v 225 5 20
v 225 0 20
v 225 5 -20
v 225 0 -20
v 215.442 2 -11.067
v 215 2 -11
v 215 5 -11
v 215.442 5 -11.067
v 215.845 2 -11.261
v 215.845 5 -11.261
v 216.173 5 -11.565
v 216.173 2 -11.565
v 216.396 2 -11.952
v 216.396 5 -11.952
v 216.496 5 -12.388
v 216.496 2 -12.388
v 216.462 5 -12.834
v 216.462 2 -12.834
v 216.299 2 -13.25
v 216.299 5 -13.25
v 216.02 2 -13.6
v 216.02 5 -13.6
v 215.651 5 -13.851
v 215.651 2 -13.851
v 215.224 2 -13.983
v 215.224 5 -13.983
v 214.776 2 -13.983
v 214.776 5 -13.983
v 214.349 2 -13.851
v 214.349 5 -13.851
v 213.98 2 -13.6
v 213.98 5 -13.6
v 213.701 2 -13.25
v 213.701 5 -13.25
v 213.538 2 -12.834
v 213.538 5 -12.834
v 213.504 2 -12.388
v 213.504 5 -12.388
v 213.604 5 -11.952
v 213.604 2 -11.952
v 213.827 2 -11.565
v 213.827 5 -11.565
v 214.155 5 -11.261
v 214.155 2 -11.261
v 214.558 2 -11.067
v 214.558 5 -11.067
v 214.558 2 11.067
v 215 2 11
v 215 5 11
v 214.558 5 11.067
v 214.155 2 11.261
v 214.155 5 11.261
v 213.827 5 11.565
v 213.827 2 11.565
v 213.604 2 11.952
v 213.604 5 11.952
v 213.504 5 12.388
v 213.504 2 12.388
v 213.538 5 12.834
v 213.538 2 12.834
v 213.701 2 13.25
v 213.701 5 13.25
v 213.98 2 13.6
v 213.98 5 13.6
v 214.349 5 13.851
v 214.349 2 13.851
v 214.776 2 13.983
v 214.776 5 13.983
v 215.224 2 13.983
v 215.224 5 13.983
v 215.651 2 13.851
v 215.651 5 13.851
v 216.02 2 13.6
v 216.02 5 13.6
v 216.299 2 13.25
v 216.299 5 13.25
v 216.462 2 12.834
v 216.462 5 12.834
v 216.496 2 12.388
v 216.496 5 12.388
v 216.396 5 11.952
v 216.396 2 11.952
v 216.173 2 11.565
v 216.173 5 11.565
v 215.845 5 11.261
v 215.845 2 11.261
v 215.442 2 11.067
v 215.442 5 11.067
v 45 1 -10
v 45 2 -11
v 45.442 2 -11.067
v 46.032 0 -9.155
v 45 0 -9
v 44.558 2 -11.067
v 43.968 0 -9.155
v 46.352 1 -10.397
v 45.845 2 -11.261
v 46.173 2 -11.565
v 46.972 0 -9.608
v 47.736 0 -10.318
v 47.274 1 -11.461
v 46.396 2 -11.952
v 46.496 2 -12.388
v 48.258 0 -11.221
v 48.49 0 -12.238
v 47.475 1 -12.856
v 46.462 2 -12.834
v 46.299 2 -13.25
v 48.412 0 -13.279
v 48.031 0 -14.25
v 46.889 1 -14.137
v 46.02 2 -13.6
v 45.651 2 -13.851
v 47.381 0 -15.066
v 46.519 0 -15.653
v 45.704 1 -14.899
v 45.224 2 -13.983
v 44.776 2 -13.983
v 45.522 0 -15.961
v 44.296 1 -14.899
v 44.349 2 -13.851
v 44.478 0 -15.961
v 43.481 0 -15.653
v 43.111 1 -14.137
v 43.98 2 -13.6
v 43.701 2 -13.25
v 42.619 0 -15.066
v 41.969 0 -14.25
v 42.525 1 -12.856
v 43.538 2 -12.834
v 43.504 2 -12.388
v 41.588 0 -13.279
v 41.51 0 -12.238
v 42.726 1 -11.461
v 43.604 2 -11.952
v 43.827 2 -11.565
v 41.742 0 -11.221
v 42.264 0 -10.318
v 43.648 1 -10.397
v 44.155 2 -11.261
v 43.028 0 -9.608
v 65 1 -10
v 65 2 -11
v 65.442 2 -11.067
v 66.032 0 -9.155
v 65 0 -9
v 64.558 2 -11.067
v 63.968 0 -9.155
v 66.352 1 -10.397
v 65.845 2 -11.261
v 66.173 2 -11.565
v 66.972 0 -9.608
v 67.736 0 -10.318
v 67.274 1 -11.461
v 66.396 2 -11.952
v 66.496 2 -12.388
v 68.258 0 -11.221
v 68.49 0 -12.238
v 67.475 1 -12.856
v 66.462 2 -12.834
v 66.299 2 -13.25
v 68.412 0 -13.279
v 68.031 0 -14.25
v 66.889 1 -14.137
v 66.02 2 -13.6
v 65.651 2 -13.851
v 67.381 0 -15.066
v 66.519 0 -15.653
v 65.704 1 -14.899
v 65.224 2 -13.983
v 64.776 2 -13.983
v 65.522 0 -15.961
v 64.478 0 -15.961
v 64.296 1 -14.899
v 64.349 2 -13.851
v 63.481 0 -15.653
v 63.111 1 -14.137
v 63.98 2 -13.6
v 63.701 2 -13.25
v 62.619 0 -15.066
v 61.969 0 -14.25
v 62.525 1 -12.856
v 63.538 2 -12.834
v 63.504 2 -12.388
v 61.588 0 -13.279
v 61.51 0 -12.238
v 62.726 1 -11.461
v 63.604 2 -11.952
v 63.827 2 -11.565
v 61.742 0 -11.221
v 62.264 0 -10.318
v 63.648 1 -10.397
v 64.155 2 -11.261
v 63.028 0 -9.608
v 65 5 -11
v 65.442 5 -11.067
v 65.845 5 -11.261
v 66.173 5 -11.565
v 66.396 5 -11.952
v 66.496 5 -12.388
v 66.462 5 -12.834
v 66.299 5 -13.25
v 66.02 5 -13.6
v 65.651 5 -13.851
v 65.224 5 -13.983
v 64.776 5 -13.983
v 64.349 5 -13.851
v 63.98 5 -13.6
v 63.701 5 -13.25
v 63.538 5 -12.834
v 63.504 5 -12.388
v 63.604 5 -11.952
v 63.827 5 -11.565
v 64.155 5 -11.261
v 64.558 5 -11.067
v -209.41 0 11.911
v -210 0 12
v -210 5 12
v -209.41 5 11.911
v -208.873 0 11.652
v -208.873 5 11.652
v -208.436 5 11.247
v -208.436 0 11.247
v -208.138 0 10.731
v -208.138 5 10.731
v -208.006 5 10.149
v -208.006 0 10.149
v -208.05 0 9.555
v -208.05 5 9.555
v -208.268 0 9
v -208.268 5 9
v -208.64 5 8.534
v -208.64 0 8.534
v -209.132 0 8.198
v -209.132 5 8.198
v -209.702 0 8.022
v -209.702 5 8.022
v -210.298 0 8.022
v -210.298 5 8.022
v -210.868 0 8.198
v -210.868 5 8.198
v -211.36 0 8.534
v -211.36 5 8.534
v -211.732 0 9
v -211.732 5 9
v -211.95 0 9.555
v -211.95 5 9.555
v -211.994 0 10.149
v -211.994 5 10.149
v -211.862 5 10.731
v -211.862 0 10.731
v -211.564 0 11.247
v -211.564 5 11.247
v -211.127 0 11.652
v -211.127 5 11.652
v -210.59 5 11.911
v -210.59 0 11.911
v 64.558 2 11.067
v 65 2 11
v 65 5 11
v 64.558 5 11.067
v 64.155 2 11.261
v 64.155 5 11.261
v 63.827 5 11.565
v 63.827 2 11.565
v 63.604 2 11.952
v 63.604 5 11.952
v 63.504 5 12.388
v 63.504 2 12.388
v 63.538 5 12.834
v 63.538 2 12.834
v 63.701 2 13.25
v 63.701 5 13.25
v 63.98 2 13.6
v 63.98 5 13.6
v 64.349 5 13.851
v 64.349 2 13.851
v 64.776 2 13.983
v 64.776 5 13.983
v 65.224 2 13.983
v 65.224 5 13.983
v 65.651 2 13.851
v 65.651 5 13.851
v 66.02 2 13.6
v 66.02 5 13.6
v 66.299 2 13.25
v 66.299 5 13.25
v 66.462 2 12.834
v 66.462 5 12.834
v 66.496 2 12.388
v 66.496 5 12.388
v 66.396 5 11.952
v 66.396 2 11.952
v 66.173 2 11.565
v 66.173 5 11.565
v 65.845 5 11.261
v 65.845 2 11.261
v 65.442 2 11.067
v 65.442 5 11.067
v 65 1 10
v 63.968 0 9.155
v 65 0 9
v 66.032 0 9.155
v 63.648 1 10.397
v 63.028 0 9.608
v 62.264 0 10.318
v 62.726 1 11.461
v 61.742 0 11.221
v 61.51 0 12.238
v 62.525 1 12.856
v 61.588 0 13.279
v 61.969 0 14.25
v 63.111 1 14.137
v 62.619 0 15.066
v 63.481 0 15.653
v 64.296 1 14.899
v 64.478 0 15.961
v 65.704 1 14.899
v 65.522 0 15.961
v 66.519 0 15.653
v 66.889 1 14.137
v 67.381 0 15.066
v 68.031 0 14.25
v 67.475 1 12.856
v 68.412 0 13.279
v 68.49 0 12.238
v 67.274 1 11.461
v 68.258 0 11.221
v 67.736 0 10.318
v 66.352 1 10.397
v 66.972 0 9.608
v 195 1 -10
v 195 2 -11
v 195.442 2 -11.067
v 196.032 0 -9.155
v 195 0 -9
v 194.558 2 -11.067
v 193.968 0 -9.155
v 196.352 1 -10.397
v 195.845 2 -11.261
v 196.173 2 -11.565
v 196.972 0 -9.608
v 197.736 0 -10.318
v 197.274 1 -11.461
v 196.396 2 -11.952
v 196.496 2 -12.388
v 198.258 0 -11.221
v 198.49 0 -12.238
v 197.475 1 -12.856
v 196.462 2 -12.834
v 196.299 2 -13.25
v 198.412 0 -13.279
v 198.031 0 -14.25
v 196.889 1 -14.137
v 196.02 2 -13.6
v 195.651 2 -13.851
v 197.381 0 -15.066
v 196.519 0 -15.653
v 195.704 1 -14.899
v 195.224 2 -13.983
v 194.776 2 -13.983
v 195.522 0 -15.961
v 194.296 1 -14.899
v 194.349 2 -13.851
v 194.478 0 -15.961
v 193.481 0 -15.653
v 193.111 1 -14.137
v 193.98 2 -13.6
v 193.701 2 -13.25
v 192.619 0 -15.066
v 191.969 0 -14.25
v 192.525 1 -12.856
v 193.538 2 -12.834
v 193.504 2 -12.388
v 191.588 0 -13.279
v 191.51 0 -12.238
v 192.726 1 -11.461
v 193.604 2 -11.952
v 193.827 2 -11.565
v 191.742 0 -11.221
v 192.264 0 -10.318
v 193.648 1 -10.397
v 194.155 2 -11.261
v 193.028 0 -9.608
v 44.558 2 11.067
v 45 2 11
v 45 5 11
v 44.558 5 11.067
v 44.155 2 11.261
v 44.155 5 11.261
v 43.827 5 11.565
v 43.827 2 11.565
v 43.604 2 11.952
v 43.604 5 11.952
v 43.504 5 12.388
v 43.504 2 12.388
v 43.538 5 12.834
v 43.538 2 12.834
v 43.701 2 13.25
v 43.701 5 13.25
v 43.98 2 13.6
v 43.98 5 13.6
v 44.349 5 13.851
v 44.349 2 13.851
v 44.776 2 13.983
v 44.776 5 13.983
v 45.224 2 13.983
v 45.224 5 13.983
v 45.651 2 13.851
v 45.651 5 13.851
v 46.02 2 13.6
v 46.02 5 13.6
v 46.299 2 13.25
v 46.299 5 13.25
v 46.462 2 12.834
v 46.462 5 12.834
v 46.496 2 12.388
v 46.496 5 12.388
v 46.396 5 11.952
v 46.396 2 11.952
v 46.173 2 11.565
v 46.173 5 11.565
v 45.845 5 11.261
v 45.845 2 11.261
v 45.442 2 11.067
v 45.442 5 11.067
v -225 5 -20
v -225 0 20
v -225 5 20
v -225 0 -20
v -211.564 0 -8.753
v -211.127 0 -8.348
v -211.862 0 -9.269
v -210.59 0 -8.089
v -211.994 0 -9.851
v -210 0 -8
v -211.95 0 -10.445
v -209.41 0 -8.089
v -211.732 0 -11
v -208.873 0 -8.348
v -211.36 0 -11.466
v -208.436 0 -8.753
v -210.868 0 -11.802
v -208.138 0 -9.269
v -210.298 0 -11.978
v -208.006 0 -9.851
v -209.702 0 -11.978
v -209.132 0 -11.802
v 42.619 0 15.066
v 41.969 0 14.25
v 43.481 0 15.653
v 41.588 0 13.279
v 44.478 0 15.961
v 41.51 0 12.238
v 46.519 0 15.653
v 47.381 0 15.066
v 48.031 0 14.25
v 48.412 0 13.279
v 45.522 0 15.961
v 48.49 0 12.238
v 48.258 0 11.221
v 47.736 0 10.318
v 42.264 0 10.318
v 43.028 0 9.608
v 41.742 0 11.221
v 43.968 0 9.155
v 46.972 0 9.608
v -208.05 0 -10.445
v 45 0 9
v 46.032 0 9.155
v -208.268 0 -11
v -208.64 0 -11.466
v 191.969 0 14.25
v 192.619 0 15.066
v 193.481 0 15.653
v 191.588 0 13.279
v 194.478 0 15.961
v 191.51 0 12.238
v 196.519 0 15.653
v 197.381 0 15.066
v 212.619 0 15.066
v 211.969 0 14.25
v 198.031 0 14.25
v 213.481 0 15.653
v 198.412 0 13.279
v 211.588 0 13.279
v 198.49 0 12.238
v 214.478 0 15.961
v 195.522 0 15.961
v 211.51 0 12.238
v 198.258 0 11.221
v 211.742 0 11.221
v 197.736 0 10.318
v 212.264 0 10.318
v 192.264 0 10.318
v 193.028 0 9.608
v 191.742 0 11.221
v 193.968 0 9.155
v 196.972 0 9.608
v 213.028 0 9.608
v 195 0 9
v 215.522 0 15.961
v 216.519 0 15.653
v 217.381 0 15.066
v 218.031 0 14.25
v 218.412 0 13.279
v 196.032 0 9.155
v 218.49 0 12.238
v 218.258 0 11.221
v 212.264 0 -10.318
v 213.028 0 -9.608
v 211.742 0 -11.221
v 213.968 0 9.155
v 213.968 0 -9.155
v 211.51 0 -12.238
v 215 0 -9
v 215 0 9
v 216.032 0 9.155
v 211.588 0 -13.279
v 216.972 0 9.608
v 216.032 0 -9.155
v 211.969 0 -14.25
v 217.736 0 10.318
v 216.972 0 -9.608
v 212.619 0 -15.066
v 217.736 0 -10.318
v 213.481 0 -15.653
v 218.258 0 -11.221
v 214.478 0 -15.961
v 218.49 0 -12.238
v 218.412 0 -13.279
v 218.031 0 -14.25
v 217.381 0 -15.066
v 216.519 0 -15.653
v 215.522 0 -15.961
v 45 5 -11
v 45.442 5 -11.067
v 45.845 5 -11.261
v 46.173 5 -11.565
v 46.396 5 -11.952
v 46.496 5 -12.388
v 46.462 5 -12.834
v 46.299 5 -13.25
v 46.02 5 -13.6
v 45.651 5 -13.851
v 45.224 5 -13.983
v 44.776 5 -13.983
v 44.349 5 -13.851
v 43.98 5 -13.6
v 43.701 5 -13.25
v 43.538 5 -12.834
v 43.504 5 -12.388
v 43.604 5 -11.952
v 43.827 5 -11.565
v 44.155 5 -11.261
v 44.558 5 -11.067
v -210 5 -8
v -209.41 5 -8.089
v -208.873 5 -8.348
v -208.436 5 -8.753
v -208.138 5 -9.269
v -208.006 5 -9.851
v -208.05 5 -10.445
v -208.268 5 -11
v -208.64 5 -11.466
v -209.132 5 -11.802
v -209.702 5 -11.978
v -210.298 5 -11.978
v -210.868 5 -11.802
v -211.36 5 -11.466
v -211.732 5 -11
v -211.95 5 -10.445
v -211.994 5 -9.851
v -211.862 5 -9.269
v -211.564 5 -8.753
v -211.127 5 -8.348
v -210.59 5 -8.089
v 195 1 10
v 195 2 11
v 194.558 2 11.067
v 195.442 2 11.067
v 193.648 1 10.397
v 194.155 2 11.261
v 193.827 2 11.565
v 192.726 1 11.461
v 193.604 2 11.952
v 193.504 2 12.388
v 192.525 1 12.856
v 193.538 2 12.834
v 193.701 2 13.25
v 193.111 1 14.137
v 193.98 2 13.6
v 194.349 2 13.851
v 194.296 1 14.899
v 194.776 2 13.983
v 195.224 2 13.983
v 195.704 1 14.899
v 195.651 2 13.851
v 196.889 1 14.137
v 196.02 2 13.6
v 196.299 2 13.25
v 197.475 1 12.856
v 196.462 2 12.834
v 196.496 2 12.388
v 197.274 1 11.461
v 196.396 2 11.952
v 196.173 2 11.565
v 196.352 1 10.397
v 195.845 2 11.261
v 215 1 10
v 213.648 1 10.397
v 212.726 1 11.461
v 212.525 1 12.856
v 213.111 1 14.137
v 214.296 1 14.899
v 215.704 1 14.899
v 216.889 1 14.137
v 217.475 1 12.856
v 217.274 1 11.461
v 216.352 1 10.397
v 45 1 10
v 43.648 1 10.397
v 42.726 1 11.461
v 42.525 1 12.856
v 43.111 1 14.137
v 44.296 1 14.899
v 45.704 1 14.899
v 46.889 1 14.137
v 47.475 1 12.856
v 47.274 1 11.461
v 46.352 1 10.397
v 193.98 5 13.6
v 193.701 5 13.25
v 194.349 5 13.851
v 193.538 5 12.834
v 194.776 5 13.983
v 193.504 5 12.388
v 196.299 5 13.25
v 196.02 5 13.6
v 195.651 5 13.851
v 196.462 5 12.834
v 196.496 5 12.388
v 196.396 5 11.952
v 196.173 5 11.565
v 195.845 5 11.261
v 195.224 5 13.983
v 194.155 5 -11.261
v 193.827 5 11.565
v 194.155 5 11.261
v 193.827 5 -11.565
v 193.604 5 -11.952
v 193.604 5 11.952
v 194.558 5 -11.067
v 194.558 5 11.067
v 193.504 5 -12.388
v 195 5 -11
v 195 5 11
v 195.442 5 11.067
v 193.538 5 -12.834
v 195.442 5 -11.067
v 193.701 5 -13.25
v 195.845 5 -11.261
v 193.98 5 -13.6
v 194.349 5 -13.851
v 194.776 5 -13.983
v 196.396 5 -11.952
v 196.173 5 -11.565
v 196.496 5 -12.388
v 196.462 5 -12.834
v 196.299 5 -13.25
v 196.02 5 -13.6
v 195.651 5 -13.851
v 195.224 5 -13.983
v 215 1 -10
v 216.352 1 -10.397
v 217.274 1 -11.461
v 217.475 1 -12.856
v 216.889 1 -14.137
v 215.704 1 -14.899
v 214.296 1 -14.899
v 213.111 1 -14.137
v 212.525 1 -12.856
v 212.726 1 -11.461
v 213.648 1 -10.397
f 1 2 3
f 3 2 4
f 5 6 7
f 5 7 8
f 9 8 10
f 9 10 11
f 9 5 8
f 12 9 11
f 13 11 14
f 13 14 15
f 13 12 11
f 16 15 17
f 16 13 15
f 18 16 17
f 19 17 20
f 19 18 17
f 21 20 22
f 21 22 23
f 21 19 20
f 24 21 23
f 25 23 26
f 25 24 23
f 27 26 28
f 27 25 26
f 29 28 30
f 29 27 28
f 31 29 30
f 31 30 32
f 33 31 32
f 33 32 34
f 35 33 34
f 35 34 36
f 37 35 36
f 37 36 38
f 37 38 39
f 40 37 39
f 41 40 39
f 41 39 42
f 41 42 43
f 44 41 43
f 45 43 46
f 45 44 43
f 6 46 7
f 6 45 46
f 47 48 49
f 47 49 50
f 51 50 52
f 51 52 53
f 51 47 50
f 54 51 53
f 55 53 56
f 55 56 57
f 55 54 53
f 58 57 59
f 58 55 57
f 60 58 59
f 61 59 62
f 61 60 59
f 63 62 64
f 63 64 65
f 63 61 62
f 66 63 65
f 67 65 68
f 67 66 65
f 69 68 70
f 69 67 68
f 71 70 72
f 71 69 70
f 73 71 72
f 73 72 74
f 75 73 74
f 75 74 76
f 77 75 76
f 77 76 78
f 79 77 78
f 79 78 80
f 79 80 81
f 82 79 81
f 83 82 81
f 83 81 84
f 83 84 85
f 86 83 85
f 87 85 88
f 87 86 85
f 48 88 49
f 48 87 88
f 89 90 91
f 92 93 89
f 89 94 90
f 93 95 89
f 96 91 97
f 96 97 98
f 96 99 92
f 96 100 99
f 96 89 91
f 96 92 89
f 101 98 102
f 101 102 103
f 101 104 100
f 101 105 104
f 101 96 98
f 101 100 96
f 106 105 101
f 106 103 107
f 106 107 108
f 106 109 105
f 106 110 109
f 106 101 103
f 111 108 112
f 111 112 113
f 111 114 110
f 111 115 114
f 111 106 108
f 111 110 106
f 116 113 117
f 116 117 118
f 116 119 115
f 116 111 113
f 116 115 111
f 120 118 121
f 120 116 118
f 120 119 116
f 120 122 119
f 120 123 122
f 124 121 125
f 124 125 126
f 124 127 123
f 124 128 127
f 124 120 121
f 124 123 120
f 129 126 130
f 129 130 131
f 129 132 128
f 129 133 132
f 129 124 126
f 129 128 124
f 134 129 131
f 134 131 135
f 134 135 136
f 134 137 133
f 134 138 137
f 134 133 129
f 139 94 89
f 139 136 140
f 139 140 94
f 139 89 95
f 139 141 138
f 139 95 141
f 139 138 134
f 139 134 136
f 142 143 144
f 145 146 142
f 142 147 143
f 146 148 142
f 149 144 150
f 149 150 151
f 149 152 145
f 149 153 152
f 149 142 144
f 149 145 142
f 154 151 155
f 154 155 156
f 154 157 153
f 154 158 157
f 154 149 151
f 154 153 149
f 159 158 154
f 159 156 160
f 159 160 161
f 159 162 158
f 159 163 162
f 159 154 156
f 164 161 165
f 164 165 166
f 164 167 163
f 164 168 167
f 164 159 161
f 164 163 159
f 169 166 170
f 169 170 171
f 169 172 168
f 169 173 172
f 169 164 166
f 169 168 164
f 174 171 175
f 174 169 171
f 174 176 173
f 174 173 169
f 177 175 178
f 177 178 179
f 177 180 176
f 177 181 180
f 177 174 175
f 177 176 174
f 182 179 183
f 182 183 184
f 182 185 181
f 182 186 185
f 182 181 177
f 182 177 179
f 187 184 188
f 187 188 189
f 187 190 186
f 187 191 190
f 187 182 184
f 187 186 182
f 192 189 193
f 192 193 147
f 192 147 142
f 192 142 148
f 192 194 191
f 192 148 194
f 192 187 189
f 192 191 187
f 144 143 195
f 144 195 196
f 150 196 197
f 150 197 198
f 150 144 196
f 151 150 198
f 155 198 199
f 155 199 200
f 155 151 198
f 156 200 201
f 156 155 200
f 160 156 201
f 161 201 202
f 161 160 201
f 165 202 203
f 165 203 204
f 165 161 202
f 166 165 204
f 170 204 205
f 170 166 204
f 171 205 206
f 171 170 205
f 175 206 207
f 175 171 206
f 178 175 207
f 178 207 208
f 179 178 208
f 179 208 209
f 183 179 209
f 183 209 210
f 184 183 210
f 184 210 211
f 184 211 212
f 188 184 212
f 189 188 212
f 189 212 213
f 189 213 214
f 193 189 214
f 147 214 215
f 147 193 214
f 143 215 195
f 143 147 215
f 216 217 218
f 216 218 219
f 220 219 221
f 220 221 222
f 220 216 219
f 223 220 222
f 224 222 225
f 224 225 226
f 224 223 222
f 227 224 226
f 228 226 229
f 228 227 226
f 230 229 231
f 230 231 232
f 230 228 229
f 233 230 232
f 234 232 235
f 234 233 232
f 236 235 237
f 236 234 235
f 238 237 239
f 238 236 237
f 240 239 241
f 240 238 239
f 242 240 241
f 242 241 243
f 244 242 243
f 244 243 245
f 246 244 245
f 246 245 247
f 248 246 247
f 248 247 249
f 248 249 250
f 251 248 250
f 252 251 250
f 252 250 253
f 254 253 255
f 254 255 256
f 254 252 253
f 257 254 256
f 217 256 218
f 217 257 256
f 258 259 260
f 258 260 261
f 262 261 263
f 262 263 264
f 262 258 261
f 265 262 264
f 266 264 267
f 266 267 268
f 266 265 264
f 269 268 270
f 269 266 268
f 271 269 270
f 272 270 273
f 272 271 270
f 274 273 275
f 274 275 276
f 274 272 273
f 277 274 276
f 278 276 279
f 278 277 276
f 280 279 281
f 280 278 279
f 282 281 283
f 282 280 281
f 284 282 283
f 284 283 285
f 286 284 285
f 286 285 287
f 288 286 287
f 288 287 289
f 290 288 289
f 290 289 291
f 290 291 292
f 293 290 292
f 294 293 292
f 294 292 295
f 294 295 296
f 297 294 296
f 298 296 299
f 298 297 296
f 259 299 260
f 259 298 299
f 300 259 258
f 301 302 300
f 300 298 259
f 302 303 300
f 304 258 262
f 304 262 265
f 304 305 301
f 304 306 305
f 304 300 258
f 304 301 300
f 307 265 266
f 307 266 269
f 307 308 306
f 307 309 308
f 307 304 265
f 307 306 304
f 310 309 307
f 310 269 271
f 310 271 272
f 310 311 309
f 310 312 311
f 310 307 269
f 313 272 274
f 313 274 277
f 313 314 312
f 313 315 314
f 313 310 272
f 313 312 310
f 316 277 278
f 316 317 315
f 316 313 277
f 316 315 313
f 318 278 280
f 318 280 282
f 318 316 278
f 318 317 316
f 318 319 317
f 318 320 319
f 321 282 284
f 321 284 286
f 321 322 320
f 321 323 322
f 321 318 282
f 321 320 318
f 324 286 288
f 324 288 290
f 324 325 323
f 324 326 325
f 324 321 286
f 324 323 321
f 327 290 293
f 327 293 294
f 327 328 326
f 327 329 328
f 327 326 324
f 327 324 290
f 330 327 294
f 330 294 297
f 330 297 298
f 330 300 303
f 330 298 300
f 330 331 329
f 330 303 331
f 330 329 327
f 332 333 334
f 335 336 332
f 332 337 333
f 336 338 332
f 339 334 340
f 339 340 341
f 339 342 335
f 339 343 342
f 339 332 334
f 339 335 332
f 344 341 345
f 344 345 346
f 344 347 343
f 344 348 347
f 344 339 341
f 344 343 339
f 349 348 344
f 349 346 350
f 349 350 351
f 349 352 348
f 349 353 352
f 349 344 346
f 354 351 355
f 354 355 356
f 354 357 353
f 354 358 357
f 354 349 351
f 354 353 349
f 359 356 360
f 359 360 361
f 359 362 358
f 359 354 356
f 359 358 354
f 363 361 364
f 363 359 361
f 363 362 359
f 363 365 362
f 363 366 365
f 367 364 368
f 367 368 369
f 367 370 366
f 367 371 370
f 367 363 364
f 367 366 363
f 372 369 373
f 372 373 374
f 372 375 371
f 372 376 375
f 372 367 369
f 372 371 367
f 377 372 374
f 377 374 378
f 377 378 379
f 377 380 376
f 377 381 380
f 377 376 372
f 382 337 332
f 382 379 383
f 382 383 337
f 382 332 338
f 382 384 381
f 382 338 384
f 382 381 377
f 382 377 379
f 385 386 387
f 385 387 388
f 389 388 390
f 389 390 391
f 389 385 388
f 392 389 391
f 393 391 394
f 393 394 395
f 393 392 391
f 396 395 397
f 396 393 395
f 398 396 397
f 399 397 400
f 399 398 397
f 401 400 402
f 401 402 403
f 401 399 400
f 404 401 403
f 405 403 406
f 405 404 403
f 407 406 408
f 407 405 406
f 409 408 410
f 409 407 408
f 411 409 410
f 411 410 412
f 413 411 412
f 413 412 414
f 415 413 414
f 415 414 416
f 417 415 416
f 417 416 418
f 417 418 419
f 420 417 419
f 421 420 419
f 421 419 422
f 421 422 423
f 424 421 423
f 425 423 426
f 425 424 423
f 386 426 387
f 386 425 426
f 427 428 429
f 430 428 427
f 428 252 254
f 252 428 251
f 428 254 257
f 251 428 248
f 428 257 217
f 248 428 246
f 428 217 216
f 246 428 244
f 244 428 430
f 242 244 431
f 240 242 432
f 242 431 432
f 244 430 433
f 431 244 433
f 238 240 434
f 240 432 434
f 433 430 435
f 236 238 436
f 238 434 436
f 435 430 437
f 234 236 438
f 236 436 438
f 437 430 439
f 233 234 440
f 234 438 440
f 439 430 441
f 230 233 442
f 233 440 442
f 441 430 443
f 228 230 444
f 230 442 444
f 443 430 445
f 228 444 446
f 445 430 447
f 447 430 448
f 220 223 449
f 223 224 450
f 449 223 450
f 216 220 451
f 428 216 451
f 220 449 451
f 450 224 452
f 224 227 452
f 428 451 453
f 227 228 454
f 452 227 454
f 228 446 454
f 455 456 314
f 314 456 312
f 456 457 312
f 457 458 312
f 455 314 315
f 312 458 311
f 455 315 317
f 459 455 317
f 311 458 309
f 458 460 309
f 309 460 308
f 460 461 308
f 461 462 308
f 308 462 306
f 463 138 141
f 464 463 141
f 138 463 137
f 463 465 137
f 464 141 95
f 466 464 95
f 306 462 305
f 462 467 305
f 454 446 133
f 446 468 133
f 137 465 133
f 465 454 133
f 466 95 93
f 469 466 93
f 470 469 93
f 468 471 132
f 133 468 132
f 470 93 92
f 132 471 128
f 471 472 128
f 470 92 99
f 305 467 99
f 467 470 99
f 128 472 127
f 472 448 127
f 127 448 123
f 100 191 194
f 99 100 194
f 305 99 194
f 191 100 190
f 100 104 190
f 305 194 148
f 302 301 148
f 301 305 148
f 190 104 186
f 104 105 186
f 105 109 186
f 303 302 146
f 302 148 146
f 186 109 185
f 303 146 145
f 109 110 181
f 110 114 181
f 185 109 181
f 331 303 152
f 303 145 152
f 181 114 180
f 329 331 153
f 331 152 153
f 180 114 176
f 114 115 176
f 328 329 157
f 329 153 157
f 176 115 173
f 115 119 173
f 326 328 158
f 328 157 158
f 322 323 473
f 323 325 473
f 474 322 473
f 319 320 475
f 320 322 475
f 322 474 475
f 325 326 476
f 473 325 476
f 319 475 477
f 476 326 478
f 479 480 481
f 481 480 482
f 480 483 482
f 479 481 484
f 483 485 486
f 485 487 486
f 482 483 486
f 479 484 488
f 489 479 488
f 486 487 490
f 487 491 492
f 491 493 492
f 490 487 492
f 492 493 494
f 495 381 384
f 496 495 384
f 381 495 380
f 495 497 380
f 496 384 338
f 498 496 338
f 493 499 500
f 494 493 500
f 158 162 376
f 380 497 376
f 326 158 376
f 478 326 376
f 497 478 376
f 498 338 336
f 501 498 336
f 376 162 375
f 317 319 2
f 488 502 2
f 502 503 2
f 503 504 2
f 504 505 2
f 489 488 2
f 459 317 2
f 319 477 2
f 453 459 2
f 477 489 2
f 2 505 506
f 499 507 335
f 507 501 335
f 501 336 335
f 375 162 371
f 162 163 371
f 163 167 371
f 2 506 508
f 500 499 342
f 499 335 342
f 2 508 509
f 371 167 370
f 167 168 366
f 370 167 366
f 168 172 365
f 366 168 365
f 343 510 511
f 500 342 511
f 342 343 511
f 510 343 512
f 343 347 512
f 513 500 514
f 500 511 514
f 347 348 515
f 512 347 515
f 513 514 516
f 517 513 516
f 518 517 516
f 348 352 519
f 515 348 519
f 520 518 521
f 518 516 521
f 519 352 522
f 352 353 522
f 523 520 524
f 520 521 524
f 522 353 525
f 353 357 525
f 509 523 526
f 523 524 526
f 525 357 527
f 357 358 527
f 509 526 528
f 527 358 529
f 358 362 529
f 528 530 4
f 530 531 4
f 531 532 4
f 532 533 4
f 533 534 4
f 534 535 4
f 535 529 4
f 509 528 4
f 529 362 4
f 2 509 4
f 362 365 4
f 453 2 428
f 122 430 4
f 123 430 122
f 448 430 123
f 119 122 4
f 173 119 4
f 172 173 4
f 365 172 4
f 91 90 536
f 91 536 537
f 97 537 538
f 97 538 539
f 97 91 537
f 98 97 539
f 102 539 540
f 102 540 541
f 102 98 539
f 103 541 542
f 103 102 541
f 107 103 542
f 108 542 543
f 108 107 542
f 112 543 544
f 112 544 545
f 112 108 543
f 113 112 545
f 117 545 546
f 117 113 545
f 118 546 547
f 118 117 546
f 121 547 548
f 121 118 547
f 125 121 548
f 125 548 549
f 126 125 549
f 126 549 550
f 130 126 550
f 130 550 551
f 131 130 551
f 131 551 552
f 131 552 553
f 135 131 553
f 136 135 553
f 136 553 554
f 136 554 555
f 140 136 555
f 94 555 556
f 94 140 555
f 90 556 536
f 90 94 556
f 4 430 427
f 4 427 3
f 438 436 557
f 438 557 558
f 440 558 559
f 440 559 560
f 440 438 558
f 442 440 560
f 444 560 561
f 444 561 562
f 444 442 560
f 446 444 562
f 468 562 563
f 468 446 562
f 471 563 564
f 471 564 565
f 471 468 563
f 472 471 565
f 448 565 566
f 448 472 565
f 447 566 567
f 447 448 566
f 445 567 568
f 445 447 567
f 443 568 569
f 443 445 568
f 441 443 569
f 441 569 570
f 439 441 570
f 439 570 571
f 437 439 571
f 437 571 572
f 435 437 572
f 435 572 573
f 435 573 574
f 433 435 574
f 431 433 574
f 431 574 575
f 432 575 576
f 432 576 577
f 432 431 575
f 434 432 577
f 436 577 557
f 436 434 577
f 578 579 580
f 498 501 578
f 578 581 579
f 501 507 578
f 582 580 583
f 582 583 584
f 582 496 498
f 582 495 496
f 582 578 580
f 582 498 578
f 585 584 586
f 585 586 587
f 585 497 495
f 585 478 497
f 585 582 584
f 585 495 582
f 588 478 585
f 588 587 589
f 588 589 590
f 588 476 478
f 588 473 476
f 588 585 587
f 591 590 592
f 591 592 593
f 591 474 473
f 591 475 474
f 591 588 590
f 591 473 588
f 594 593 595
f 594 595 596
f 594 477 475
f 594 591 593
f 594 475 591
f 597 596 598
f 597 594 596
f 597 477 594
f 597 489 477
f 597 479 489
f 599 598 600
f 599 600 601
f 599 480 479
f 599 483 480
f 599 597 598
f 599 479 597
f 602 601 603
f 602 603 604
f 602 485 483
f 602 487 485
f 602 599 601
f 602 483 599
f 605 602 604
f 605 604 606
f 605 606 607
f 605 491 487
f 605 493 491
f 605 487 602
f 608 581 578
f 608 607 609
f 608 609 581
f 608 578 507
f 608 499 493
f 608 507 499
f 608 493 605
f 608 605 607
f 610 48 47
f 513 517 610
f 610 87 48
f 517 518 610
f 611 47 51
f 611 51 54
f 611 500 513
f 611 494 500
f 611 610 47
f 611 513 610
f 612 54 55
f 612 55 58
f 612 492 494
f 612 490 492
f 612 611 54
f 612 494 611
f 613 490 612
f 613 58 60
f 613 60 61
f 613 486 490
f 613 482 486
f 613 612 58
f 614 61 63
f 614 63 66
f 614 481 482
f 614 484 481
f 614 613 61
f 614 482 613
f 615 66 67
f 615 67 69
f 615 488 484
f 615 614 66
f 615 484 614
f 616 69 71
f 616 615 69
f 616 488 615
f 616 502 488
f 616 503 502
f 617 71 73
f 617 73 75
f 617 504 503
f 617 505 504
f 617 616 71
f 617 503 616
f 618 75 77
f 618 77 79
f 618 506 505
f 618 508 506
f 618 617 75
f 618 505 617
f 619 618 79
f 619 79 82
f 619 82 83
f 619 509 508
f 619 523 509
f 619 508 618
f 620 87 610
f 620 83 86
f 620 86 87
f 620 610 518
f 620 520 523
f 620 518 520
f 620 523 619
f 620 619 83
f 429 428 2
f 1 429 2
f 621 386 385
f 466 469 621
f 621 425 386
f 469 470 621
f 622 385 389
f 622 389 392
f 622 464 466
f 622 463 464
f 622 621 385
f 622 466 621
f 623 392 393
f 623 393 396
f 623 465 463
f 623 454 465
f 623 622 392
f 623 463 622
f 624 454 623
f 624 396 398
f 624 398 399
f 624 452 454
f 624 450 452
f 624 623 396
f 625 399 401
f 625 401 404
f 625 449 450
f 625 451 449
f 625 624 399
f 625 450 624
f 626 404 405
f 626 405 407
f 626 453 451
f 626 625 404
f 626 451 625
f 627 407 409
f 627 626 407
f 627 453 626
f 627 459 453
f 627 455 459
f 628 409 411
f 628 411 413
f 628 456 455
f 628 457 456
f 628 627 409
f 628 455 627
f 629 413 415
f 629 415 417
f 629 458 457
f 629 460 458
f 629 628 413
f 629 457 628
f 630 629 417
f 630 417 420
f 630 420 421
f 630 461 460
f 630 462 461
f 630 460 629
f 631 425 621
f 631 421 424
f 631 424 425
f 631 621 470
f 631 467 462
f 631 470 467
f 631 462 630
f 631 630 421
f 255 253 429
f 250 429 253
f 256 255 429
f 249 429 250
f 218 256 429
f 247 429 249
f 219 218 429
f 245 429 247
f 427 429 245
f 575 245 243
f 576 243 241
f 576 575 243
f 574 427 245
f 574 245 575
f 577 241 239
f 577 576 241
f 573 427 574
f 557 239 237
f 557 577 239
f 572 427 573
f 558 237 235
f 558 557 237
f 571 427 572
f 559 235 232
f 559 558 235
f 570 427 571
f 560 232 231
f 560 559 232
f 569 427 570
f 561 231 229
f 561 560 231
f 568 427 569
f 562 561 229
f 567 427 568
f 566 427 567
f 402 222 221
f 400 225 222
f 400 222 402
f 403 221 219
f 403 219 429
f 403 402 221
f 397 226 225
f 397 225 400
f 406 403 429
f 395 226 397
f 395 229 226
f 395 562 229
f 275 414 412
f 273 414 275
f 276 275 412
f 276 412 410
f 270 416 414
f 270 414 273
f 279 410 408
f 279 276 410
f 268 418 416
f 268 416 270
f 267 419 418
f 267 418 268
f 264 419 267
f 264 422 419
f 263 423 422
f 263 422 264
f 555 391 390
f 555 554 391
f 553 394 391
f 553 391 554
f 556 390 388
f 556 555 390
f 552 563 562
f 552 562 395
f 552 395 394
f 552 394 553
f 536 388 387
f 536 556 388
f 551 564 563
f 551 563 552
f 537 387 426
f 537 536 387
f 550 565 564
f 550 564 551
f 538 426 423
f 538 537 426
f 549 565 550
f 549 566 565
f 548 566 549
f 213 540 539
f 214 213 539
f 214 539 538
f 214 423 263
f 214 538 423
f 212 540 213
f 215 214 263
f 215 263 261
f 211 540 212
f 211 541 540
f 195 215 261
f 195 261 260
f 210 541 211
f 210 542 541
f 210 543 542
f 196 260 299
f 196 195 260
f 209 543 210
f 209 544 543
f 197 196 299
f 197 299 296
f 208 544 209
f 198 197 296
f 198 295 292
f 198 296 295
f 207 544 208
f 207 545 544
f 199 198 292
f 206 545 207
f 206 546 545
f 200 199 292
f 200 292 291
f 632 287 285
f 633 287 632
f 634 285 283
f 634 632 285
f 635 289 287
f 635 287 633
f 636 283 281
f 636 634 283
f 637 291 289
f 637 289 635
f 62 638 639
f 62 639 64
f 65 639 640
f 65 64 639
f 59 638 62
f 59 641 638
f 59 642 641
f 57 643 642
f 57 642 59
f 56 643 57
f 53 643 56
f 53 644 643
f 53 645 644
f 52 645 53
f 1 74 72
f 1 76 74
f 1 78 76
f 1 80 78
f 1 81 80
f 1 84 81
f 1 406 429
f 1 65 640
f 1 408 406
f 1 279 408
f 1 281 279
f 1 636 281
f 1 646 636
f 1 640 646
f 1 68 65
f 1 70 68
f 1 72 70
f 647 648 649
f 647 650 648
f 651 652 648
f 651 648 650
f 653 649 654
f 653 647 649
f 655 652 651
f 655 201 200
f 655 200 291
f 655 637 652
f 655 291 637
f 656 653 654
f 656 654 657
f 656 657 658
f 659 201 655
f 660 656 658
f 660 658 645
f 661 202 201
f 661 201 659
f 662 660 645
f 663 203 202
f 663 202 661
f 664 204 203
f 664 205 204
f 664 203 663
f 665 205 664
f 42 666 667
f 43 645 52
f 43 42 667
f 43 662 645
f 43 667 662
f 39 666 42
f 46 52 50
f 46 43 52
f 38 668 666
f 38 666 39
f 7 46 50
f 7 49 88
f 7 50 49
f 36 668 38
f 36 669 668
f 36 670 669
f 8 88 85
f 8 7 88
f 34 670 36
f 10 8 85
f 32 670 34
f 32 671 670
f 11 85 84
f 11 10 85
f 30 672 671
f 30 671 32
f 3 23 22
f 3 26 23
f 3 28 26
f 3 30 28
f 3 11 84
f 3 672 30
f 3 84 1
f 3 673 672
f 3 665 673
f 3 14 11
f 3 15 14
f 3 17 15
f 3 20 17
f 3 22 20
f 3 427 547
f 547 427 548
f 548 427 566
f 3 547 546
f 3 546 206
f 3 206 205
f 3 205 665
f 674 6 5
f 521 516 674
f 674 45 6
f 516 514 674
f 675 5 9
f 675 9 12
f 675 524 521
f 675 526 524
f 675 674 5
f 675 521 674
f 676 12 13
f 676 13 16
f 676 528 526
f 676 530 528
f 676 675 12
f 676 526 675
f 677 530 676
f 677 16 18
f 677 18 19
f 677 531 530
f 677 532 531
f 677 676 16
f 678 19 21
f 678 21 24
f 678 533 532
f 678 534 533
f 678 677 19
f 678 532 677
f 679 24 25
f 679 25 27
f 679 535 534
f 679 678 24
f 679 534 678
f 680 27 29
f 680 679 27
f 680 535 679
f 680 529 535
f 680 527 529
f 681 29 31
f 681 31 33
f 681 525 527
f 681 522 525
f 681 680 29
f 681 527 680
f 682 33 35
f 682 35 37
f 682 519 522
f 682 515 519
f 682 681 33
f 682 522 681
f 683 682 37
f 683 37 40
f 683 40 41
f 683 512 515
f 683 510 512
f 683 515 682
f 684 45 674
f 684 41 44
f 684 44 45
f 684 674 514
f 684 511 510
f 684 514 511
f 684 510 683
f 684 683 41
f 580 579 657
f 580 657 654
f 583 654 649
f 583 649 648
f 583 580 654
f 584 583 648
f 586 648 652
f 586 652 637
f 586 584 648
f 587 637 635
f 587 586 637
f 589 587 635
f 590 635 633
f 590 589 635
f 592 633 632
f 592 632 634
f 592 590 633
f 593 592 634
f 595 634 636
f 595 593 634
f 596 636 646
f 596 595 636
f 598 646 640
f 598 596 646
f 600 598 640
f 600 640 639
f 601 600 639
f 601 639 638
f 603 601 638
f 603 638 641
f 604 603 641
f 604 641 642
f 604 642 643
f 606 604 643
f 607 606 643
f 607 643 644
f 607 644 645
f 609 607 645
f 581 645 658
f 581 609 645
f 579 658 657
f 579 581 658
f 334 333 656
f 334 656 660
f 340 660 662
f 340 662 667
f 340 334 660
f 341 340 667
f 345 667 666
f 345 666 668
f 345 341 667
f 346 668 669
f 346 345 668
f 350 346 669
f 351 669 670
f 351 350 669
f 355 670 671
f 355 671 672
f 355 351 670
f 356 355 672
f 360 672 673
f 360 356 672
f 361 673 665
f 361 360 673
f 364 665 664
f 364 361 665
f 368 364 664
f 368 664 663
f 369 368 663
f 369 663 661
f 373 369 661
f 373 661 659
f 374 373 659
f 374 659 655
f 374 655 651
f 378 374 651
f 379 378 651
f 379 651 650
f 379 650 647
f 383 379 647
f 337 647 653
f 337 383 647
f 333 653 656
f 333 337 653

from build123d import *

# Parameters (mm, degrees)
SKETCH_1_W      = 450
SKETCH_1_H      = 40
SKETCH_1_R      = 1.5
SKETCH_1_R_2    = 2
EXTRUDE_1_DEPTH = 5
CHAMFER_1_SIZE  = 2


with BuildPart() as part:
    # 草图1 → 凸台-拉伸1 (new body)
    with BuildSketch(Plane(origin=(0, 0, 0), x_dir=(1, 0, 0), z_dir=(0, 1, 0))):
        Rectangle(SKETCH_1_W, SKETCH_1_H)
        with Locations(Location((215, 12.5, 0), (0, 0, 270))):
            Circle(SKETCH_1_R, mode=Mode.SUBTRACT)
        with Locations(Location((195, 12.5, 0), (0, 0, 270))):
            Circle(SKETCH_1_R, mode=Mode.SUBTRACT)
        with Locations(Location((195, -12.5, 0), (0, 0, 90))):
            Circle(SKETCH_1_R, mode=Mode.SUBTRACT)
        with Locations(Location((215, -12.5, 0), (0, 0, 90))):
            Circle(SKETCH_1_R, mode=Mode.SUBTRACT)
        with Locations(Location((65, -12.5, 0), (0, 0, 90))):
            Circle(SKETCH_1_R, mode=Mode.SUBTRACT)
        with Locations(Location((45, 12.5, 0), (0, 0, 270))):
            Circle(SKETCH_1_R, mode=Mode.SUBTRACT)
        with Locations(Location((65, 12.5, 0), (0, 0, 270))):
            Circle(SKETCH_1_R, mode=Mode.SUBTRACT)
        with Locations(Location((45, -12.5, 0), (0, 0, 90))):
            Circle(SKETCH_1_R, mode=Mode.SUBTRACT)
        with Locations(Location((-210, 10, 0), (0, 0, 270))):
            Circle(SKETCH_1_R_2, mode=Mode.SUBTRACT)
        with Locations(Location((-210, -10, 0), (0, 0, 270))):
            Circle(SKETCH_1_R_2, mode=Mode.SUBTRACT)
    extrude(amount=EXTRUDE_1_DEPTH)

    # 倒角1
    chamfer_1_edges = [part.edges().sort_by_distance(p)[0] for p in [
        (215, 0, -14),
        (195, 0, -14),
        (195, 0, 14),
        (215, 0, 14),
        (65, 0, -14),
        (45, 0, -14),
        (45, 0, 14),
        (65, 0, 14),
    ]]
    chamfer(chamfer_1_edges, length=CHAMFER_1_SIZE)


solid = part.part
